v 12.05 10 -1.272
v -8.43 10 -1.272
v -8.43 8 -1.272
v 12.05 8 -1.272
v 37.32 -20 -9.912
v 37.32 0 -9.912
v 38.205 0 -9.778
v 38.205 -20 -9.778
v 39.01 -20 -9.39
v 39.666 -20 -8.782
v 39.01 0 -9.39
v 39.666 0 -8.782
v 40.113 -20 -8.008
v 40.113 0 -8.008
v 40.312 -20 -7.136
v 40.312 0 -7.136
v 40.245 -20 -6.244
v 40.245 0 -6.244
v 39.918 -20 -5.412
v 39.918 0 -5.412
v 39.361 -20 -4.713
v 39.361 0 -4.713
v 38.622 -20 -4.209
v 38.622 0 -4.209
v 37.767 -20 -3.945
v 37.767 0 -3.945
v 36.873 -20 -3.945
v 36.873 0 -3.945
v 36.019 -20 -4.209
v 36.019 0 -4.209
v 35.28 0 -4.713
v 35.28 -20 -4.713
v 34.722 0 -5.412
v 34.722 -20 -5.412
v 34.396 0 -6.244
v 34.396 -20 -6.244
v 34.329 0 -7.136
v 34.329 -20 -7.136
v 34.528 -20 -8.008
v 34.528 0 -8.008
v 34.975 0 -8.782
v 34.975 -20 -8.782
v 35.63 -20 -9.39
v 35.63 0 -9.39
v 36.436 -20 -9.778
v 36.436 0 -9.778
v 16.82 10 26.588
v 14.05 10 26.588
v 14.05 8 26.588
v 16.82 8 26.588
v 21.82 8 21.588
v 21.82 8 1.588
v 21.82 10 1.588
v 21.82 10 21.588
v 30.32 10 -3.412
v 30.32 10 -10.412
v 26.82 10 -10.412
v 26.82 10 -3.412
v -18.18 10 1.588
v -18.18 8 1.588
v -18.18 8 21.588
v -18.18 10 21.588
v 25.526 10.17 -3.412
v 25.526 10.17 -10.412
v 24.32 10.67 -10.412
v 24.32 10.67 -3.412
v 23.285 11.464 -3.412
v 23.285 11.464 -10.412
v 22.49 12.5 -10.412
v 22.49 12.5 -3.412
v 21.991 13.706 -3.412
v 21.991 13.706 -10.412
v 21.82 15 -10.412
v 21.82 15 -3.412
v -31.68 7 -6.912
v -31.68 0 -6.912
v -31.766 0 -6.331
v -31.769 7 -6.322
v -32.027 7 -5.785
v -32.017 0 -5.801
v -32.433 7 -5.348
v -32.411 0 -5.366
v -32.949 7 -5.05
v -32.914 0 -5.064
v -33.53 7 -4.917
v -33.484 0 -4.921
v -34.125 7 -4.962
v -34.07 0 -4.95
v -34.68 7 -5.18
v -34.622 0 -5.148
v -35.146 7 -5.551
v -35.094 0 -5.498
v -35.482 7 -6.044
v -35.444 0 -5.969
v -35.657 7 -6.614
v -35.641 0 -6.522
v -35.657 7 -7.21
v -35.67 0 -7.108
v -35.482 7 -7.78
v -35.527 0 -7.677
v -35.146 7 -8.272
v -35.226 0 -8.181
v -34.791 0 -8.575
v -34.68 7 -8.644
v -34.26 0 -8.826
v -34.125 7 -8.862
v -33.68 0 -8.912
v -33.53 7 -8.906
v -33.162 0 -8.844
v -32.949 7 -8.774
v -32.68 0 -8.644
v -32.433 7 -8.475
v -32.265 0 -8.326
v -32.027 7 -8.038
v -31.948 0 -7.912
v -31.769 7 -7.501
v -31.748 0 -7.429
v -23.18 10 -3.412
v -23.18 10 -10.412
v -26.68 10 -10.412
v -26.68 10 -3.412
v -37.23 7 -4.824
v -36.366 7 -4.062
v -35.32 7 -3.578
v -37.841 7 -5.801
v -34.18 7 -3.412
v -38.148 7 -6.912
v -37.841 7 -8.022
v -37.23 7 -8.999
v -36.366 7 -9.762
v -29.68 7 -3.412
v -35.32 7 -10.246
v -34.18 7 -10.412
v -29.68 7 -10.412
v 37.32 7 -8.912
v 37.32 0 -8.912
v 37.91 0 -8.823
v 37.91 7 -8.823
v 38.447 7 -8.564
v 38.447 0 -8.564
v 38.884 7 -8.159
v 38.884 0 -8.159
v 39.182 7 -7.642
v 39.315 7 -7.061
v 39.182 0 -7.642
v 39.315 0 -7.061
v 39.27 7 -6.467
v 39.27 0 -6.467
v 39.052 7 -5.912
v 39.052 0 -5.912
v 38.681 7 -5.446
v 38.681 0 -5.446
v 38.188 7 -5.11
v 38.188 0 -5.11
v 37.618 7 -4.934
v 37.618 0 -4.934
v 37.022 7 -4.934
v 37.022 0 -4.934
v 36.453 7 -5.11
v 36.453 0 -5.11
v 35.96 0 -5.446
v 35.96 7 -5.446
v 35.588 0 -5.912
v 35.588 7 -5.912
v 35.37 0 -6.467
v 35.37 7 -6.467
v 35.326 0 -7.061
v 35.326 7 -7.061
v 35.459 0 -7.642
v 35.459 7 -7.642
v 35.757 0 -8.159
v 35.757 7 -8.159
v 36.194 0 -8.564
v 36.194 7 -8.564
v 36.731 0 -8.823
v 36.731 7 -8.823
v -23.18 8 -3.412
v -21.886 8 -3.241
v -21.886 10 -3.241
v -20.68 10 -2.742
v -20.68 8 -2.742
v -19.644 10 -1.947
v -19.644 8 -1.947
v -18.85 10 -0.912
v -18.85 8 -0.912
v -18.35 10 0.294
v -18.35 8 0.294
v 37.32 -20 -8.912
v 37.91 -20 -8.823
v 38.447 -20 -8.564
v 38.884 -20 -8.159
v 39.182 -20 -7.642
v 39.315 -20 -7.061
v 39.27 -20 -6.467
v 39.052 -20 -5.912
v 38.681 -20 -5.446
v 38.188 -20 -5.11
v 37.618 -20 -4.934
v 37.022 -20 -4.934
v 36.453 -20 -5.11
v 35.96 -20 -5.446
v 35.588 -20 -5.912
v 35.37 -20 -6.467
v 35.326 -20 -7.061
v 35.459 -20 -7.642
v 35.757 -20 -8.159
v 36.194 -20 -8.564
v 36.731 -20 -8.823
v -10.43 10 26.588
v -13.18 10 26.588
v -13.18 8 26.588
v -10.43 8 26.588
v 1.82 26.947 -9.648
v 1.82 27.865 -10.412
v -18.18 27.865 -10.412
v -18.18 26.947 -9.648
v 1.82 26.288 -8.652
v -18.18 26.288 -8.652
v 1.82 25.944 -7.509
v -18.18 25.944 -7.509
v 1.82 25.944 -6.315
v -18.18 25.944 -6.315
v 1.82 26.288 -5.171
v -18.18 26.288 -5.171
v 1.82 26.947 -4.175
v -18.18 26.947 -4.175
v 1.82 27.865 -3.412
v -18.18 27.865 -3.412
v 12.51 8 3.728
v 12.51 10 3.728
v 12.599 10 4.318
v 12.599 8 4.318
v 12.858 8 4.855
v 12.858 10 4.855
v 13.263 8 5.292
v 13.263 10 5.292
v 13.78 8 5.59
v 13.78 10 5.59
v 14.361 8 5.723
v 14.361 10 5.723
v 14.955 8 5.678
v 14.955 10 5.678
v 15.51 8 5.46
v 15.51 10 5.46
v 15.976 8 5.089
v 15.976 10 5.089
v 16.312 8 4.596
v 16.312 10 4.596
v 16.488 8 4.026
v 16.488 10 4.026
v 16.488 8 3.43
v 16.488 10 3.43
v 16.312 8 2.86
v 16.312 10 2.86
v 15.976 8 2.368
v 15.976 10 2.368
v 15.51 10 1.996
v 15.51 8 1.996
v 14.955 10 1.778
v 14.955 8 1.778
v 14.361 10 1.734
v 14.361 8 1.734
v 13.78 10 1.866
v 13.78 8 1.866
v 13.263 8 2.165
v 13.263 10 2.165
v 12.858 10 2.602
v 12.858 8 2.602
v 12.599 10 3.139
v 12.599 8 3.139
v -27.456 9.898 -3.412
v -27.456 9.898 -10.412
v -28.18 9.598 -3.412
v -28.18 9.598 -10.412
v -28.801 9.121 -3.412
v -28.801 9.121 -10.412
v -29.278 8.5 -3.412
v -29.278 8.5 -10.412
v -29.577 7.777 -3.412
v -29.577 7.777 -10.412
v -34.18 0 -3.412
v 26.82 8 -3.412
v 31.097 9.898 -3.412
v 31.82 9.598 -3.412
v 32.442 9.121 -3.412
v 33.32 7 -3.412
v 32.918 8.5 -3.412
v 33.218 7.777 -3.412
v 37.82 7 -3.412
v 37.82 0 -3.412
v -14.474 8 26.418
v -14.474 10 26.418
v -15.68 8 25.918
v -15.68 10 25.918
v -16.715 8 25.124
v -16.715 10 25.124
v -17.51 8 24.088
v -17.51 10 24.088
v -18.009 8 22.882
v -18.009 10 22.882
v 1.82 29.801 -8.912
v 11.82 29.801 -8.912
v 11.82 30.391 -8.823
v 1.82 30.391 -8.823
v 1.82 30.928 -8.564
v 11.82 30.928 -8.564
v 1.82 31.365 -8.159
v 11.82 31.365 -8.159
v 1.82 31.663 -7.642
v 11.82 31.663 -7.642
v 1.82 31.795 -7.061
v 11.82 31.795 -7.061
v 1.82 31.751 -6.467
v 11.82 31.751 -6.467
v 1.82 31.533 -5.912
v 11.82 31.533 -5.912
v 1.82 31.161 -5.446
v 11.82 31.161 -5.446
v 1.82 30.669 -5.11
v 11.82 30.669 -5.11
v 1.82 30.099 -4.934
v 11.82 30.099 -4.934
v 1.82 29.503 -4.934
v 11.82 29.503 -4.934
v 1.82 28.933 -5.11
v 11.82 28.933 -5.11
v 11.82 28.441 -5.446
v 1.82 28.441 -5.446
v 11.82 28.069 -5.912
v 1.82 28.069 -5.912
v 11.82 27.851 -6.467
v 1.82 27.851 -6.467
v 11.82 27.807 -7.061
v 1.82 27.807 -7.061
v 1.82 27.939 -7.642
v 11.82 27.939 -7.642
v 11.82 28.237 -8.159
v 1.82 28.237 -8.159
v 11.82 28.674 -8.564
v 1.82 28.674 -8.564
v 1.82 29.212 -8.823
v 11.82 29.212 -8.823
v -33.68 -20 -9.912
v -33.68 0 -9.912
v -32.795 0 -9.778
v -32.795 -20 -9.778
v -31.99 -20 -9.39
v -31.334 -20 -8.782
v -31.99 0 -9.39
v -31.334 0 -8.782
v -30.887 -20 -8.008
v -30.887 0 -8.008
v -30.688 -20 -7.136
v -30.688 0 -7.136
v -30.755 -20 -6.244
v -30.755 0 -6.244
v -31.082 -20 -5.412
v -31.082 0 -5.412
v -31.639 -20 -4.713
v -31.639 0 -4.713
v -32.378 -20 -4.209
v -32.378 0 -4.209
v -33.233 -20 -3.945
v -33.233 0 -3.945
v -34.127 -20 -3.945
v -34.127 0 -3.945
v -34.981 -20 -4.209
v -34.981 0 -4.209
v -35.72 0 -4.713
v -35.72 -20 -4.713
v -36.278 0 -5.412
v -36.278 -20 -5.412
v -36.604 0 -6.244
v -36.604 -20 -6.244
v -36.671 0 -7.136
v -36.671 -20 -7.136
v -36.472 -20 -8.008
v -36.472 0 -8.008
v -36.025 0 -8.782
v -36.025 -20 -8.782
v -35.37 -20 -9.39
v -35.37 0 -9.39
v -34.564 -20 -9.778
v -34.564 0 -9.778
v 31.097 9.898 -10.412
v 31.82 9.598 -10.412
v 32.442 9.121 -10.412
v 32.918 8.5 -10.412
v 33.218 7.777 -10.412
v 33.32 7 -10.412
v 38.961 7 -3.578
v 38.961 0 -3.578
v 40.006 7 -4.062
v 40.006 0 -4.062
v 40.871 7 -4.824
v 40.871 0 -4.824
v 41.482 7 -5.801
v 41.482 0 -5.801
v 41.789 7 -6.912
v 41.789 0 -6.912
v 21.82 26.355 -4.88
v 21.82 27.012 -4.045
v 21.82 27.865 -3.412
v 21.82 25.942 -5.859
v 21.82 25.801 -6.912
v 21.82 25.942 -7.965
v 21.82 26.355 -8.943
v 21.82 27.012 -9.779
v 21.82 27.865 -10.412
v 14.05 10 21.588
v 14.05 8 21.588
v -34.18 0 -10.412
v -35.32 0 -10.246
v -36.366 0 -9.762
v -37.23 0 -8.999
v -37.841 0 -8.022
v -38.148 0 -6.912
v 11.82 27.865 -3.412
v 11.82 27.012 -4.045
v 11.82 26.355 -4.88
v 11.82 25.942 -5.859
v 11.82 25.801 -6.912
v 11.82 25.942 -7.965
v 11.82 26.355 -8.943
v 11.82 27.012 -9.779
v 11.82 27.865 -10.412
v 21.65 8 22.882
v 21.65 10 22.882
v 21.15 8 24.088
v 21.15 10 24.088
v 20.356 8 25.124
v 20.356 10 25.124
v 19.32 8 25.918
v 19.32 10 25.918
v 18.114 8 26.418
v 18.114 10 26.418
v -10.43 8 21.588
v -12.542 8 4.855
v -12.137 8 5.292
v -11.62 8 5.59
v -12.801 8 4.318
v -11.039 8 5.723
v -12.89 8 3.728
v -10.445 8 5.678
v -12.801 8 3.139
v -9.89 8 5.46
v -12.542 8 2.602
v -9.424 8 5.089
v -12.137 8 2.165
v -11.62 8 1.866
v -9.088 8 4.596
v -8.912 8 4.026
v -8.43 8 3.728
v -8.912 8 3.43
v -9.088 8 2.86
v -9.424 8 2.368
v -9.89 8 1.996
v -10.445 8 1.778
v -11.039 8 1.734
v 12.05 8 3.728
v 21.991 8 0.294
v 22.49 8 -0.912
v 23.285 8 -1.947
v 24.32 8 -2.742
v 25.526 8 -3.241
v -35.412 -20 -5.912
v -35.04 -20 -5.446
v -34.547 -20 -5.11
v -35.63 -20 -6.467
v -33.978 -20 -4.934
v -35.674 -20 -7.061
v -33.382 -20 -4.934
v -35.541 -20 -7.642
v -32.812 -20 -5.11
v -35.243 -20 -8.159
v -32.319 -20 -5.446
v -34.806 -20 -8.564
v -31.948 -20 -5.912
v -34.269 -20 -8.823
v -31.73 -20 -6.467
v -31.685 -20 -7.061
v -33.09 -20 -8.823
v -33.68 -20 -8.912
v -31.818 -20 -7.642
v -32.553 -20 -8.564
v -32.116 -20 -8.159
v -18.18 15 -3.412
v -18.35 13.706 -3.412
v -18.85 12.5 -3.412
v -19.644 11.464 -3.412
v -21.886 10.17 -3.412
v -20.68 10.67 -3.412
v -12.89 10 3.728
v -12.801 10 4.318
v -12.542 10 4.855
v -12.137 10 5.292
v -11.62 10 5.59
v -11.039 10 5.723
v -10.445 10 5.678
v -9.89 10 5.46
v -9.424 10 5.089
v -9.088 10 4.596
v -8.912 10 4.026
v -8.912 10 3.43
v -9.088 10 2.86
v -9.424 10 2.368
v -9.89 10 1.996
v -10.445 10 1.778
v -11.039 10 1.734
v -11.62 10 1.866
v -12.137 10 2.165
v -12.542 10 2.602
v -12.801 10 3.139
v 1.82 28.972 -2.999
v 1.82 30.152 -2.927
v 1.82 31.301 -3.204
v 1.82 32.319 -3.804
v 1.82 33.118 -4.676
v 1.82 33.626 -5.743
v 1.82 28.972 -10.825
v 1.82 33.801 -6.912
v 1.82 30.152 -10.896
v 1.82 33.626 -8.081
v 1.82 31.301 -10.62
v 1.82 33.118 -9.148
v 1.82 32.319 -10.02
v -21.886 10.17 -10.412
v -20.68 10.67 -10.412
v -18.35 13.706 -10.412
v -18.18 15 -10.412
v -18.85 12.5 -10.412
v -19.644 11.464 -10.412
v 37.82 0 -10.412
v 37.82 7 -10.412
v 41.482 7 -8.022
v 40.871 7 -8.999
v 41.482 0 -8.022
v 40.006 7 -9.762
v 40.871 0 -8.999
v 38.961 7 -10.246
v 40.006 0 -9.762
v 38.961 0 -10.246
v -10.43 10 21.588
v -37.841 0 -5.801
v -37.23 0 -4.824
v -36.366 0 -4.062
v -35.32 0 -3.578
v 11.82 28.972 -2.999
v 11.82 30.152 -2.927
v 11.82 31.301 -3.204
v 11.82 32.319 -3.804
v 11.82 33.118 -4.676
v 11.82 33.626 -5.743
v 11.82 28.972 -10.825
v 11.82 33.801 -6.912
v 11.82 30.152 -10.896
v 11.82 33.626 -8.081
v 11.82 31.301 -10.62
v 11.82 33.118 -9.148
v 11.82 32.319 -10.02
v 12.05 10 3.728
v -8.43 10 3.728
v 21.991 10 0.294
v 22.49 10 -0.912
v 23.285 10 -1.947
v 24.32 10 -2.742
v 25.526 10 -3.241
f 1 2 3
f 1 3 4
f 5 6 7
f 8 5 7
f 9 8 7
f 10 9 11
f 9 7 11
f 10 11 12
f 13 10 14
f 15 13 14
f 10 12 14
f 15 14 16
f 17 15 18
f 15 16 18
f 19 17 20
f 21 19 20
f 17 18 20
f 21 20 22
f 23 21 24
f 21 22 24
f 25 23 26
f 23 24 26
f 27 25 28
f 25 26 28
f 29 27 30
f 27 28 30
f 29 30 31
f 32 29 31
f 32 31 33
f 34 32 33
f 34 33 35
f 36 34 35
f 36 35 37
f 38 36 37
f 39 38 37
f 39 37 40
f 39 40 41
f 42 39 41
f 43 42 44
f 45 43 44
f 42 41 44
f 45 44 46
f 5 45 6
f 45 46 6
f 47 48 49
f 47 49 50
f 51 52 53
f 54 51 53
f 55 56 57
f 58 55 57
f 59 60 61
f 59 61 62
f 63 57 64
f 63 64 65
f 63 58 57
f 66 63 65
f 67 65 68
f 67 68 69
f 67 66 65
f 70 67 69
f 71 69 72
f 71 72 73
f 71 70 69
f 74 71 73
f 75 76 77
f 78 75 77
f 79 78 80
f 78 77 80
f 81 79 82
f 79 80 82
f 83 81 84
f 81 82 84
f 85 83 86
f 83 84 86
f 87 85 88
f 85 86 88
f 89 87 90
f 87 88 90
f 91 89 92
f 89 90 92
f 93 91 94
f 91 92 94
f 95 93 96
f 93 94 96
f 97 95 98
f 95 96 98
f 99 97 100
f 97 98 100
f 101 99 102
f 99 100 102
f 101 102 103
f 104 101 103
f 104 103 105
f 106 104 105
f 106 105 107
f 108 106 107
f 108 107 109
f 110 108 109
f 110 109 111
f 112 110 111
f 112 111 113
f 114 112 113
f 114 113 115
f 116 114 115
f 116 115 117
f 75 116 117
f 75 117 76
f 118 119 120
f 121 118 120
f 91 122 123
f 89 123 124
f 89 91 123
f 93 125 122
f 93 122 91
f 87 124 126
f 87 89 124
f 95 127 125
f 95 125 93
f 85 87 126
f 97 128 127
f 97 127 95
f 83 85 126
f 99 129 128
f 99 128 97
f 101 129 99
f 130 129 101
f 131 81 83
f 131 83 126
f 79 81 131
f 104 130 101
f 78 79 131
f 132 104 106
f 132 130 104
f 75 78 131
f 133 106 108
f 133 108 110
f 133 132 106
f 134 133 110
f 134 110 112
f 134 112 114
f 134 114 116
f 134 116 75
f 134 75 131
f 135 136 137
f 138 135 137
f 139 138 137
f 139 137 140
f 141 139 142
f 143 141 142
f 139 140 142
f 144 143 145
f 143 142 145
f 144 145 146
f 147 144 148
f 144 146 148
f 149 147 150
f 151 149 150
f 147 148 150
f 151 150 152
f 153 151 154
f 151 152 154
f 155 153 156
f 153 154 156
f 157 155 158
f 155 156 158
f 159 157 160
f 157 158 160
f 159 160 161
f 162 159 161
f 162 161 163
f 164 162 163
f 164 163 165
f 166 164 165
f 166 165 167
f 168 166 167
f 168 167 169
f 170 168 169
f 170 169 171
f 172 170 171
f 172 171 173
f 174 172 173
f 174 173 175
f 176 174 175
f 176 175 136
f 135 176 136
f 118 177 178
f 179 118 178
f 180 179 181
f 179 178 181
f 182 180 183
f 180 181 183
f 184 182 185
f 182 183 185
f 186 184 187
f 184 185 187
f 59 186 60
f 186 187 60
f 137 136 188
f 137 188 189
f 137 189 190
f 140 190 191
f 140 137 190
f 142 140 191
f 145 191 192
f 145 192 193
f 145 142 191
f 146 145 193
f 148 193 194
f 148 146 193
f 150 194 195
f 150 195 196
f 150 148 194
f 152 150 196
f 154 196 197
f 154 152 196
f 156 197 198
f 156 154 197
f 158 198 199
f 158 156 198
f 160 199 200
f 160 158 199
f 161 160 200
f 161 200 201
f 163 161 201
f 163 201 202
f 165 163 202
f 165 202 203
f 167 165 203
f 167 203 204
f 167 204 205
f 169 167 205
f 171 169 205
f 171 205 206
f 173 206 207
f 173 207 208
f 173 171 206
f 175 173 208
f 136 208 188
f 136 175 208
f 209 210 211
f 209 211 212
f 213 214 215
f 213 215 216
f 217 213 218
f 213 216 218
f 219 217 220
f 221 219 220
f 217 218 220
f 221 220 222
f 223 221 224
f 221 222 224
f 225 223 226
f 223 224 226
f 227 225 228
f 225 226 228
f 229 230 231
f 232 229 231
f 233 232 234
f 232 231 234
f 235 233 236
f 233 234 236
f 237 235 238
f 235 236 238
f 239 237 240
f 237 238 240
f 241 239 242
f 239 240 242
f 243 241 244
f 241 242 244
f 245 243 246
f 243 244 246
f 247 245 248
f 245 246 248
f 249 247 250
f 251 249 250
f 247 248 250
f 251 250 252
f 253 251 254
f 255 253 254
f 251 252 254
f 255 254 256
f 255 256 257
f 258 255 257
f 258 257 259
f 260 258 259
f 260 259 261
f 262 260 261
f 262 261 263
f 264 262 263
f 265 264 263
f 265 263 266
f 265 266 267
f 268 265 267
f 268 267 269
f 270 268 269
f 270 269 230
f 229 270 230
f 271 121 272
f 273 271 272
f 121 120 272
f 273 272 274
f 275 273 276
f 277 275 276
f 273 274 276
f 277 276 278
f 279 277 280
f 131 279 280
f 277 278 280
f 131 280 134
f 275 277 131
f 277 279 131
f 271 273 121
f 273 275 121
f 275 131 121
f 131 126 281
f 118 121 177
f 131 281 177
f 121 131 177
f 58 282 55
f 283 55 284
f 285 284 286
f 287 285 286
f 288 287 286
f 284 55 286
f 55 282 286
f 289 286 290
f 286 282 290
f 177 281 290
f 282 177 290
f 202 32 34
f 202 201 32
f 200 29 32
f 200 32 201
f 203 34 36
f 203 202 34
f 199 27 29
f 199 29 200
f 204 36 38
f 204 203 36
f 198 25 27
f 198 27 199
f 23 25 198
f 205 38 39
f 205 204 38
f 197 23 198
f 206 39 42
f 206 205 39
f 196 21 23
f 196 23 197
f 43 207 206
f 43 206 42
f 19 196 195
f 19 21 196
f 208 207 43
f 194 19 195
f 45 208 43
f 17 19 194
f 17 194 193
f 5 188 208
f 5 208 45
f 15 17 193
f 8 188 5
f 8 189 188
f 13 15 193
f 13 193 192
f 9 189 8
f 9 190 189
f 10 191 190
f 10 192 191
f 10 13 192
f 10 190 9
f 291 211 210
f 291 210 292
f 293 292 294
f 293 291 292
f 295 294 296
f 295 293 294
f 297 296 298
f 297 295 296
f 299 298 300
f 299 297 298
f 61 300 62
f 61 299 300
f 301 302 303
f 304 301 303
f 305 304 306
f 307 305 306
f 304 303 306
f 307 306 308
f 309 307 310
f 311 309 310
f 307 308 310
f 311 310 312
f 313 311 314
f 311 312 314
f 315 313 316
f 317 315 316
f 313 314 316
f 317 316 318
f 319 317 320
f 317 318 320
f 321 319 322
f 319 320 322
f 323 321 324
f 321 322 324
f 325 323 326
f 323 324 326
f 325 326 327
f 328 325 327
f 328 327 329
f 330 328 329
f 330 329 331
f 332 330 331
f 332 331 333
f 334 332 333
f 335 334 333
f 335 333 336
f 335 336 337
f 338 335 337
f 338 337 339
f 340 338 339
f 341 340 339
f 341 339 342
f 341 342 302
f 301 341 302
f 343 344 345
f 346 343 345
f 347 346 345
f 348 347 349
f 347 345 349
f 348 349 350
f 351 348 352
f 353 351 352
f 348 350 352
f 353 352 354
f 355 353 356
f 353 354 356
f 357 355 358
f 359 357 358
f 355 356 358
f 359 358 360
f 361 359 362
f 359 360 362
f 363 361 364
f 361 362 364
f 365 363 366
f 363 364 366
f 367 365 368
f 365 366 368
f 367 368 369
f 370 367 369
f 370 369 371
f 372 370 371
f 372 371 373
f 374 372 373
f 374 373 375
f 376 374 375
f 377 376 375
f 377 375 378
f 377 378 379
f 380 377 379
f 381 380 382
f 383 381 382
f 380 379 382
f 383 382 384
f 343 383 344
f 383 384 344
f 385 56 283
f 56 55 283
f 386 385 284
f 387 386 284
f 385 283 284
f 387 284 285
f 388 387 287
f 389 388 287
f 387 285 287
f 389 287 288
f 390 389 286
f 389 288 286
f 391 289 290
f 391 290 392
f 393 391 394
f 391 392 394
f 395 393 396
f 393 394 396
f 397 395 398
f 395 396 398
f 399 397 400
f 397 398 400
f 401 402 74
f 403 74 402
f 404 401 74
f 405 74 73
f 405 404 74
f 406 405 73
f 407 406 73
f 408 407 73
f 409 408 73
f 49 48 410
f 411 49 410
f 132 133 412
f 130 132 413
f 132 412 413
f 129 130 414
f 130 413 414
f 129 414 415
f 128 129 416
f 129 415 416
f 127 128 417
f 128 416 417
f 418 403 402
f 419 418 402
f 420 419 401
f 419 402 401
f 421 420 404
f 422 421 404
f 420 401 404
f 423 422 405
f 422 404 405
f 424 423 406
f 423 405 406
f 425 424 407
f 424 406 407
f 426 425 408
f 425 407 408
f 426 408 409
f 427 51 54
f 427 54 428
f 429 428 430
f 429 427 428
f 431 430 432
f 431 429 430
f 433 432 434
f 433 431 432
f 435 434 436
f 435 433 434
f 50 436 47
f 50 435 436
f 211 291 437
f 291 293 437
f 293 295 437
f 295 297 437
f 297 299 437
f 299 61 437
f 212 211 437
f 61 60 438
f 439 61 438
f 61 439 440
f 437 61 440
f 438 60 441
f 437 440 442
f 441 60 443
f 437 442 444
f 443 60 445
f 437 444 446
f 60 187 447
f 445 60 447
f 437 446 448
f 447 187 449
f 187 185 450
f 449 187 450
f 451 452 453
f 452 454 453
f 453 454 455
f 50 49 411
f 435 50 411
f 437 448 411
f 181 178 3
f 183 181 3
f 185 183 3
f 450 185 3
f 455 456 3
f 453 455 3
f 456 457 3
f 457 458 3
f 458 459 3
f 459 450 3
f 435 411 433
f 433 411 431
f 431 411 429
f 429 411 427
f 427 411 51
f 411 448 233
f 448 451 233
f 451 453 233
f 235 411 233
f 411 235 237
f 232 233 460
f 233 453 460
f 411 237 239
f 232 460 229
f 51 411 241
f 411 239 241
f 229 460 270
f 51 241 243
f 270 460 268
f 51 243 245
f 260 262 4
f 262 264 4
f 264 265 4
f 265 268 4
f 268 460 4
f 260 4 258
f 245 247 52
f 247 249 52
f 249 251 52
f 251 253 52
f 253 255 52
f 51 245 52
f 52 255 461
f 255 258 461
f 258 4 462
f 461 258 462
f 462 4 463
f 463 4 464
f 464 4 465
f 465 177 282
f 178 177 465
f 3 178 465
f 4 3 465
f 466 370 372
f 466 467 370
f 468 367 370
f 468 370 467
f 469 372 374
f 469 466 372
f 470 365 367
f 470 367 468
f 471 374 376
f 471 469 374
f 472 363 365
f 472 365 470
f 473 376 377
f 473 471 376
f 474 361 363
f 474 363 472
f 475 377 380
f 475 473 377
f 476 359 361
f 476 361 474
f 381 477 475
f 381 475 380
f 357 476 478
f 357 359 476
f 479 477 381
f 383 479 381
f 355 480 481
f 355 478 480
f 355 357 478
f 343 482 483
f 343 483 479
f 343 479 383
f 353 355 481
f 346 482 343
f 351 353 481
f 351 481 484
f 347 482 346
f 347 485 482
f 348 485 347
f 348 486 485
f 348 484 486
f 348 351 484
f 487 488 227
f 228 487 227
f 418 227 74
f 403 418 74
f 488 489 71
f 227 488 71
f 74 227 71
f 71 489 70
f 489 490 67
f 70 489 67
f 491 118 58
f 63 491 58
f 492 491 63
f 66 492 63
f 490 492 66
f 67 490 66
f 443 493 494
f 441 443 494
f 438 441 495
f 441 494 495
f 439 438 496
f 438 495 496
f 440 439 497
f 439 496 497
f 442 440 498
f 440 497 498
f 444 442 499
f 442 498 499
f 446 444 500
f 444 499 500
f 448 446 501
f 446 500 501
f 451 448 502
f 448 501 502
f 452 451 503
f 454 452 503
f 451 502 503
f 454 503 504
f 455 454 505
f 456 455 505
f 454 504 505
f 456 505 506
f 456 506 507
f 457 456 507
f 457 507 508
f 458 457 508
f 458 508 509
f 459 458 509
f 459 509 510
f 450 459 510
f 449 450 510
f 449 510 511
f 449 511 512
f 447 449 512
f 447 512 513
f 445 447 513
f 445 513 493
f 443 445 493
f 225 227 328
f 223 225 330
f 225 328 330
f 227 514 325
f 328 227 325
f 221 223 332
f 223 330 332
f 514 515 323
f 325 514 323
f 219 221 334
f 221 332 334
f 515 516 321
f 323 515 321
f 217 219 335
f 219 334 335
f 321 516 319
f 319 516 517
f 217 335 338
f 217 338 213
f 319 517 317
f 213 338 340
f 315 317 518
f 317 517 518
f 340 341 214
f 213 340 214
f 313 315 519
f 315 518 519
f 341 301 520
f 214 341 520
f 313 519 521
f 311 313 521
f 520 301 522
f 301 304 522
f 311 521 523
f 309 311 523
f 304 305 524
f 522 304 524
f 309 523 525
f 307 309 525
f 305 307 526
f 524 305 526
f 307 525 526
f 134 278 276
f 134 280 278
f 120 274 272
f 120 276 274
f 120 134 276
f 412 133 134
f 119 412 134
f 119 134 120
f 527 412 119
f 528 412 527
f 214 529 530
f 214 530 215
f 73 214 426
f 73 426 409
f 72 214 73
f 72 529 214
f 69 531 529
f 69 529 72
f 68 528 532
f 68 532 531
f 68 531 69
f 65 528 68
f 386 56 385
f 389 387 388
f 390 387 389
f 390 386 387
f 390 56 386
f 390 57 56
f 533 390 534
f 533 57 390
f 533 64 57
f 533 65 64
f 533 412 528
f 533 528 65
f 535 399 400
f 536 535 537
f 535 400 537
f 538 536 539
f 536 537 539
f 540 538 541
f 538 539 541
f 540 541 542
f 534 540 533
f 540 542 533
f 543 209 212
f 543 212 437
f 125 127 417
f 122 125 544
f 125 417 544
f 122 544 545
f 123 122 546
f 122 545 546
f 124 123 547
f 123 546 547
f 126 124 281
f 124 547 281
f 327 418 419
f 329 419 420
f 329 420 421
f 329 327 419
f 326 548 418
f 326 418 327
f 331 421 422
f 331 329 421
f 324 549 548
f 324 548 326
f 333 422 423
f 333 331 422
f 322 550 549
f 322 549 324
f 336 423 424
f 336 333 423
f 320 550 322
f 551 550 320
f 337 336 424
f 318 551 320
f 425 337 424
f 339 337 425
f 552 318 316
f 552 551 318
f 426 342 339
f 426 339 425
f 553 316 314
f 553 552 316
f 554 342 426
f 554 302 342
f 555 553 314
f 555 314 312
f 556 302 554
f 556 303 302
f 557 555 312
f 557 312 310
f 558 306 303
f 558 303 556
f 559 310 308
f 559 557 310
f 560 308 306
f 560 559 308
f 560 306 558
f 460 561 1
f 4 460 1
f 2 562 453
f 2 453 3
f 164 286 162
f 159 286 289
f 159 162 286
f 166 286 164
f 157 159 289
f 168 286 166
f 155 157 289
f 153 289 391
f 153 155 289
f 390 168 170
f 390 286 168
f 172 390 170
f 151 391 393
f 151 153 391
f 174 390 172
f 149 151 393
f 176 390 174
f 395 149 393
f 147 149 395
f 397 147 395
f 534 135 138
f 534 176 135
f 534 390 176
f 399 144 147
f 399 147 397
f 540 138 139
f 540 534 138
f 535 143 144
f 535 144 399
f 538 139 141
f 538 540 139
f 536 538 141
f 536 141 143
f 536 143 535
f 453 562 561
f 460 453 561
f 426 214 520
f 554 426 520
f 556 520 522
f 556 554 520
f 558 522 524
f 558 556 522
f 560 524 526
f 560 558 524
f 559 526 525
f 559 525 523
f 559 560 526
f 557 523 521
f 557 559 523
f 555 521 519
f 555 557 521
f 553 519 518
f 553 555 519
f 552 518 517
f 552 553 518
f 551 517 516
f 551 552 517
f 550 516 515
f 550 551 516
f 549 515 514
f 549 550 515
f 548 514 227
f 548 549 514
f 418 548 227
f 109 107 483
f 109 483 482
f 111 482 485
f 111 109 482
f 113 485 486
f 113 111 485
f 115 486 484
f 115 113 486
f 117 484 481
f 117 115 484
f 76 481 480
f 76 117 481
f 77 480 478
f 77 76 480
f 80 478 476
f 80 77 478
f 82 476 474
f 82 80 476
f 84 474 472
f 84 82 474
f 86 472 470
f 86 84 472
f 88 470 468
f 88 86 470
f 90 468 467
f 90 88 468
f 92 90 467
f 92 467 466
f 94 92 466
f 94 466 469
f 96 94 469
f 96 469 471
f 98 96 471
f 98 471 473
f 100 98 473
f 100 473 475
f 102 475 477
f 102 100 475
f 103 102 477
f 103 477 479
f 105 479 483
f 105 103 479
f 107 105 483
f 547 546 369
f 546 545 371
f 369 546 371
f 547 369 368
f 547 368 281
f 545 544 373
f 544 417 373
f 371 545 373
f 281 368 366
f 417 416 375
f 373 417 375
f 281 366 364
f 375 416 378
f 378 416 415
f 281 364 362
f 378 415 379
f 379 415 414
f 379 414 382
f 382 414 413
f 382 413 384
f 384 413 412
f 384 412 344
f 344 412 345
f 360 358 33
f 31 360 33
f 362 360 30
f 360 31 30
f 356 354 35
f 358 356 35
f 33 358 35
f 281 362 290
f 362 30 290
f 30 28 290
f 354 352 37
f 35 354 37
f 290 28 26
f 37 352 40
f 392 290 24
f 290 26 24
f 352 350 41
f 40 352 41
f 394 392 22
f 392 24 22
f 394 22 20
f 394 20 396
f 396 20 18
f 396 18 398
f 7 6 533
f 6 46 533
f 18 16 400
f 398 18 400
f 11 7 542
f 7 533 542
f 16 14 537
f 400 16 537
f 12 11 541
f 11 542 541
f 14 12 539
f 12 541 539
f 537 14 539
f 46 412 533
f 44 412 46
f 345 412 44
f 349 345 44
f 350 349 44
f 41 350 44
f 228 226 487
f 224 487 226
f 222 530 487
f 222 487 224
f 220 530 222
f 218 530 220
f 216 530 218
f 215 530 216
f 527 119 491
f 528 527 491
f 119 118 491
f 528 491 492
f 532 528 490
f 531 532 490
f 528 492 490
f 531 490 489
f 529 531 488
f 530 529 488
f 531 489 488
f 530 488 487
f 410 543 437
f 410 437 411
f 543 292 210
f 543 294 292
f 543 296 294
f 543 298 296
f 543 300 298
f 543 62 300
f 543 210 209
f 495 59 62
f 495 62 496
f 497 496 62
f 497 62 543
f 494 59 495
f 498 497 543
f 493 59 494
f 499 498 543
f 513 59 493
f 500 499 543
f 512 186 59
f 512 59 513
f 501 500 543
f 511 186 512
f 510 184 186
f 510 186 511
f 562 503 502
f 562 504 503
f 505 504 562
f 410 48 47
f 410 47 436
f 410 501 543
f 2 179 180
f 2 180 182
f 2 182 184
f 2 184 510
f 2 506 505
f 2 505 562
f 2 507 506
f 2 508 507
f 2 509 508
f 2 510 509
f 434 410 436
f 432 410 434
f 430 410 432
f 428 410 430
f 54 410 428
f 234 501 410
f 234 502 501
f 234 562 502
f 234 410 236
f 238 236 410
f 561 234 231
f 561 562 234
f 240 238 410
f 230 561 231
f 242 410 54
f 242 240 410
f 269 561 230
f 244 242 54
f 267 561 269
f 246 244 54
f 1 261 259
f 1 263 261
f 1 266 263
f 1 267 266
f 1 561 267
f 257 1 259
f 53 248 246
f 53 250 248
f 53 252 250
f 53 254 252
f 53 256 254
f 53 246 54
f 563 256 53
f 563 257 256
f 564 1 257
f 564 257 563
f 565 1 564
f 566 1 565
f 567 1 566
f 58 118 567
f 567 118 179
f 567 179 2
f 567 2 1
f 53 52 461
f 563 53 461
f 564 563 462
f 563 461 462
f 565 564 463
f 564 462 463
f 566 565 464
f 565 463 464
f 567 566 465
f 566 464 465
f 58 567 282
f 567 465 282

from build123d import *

# Parameters (mm, degrees)
SKETCH1_W           = 80
SKETCH1_H           = 7
BOSS_EXTRUDE1_DEPTH = 30
SKETCH2_R           = 3
SKETCH2_R_2         = 2
BOSS_EXTRUDE2_DEPTH = 20
SKETCH7_W           = 20
SKETCH7_H           = 20
CUT_EXTRUDE1_DEPTH  = 52.941693496
SKETCH9_R           = 4.1
CUT_EXTRUDE2_DEPTH  = 68.885232888
SKETCH11_R          = 4
SKETCH11_R_2        = 2
BOSS_EXTRUDE6_DEPTH = 20
FILLET1_R           = 5
FILLET2_R           = 4
SKETCH14_W          = 40
SKETCH14_H          = 2
BOSS_EXTRUDE8_DEPTH = 30
FILLET4_START       = 8
FILLET4_DEPTH       = 2
FILLET4_2_DEPTH     = 2
SKETCH15_R          = 2
CUT_EXTRUDE3_DEPTH  = 58.907259499
SKETCH16_W          = 20.48
SKETCH16_H          = 5
SKETCH16_W_2        = 24.48
CUT_EXTRUDE4_DEPTH  = 58.907259499
SKETCH11_2_R        = 4
SKETCH11_2_R_2      = 2
CUT_EXTRUDE5_DEPTH  = 10
CUT_EXTRUDE6_REACH  = 61.965
SKETCH17_R          = 2
CUT_EXTRUDE7_START  = -3
CUT_EXTRUDE7_DEPTH  = 3
FILLET5_R           = 3


with BuildPart() as part:
    # Sketch1 → Boss-Extrude1 (new body)
    with BuildSketch(Plane(origin=(0, 0, 0), x_dir=(1, 0, 0), z_dir=(0, 1, 0))):
        with Locations((1.820324284, 6.911764706)):
            Rectangle(SKETCH1_W, SKETCH1_H)
    extrude(amount=BOSS_EXTRUDE1_DEPTH)

    # Sketch2 → Boss-Extrude2 (add)
    # profile 1 of 2: a face of its own
    with BuildSketch(Plane.XZ):
        with Locations(Location((-33.679675716, -6.911764706, 0), (0, 0, 270))):
            Circle(SKETCH2_R)
        with Locations(Location((-33.679675716, -6.911764706, 0), (0, 0, 270))):
            Circle(SKETCH2_R_2, mode=Mode.SUBTRACT)
    # profile 2 of 2: a face of its own
    with BuildSketch(Plane.XZ):
        with Locations(Location((37.320324284, -6.911764706, 0), (0, 0, 270))):
            Circle(SKETCH2_R)
        with Locations(Location((37.320324284, -6.911764706, 0), (0, 0, 270))):
            Circle(SKETCH2_R_2, mode=Mode.SUBTRACT)
    extrude(amount=BOSS_EXTRUDE2_DEPTH)

    # Sketch7 → Cut-Extrude1 (cut, through all)
    with BuildSketch(Plane(origin=(0, 0, -10.411764706), x_dir=(-1, 0, 0), z_dir=(0, 0, -1))):
        with Locations((-31.820324284, 20)):
            Rectangle(SKETCH7_W, SKETCH7_H)
        with Locations((28.179675716, 20)):
            Rectangle(SKETCH7_W, SKETCH7_H)
    extrude(amount=-CUT_EXTRUDE1_DEPTH, mode=Mode.SUBTRACT)

    # Sketch9 → Cut-Extrude2 (cut, through all)
    with BuildSketch(Plane.ZY.offset(18.179675716)):
        with Locations((-6.911764706, 30)):
            Circle(SKETCH9_R)
    extrude(amount=-CUT_EXTRUDE2_DEPTH, mode=Mode.SUBTRACT)

    # Sketch11 → Boss-Extrude6 (add)
    with BuildSketch(Plane(origin=(21.820324284, 0, 0), x_dir=(0, 0, -1), z_dir=(1, 0, 0))):
        with Locations((6.911764706, 29.801076023)):
            Circle(SKETCH11_R)
        with Locations((6.911764706, 29.801076023)):
            Circle(SKETCH11_R_2, mode=Mode.SUBTRACT)
    extrude(amount=-BOSS_EXTRUDE6_DEPTH)

    # Fillet1
    fillet1_edges = [part.edges().sort_by_distance(p)[0] for p in [
        (21.820324284, 10, -6.911764706),
        (-18.179675716, 10, -6.911764706),
    ]]
    fillet(fillet1_edges, radius=FILLET1_R)

    # Fillet2
    # the kernel refuses this fillet: 4 mm, written as the material it takes off along each edge
    with BuildSketch(Plane(origin=(41.820324284, -10, -10.411764706), x_dir=(-1, 0, 0), z_dir=(0, 1, 0)), Plane(origin=(41.820324284, -10, -3.411764706), x_dir=(0, 0, -1), z_dir=(0, 1, 0))) as fillet2_piece_1:
        with BuildLine():
            CenterArc((FILLET2_R, FILLET2_R), FILLET2_R, 180, 90)
            Line((0, FILLET2_R), (0, 0))
            Line((0, 0), (FILLET2_R, 0))
        make_face()
    extrude(amount=30, mode=Mode.SUBTRACT)
    with BuildSketch(Plane(origin=(-38.179675716, -10, -3.411764706), x_dir=(0, 0, -1), z_dir=(0, 1, 0)), Plane(origin=(-38.179675716, -10, -10.411764706), x_dir=(1, 0, 0), z_dir=(0, 1, 0))) as fillet2_piece_2:
        with BuildLine():
            CenterArc((FILLET2_R, -FILLET2_R), FILLET2_R, 90, 90)
            Line((0, -FILLET2_R), (0, 0))
            Line((0, 0), (FILLET2_R, 0))
        make_face()
    extrude(amount=30, mode=Mode.SUBTRACT)

    # Sketch14 → Boss-Extrude8 (add)
    with BuildSketch(Plane.XY.offset(-3.411764706)):
        with Locations((1.820324284, 9)):
            Rectangle(SKETCH14_W, SKETCH14_H)
    extrude(amount=BOSS_EXTRUDE8_DEPTH)

    # Fillet4: read off the stored shape, not the designer's step
    # Fillet4 outline → Fillet4 (cut)
    with BuildSketch(Plane(origin=(0, 0, 0), x_dir=(1, 0, 0), z_dir=(0, 1, 0)).offset(FILLET4_START)):
        with BuildLine():
            Line((-18.179675716, -26.588235294), (-13.179675716, -26.588235294))
            ThreePointArc((-13.179675716, -26.588235294), (-16.715209622, -25.1237692), (-18.179675716, -21.588235294))
            Line((-18.179675716, -21.588235294), (-18.179675716, -26.588235294))
        make_face()
        with BuildLine():
            ThreePointArc((21.820324284, -21.588235294), (20.35585819, -25.123769199), (16.820324284, -26.588235294))
            Line((16.820324284, -26.588235294), (21.820324284, -26.588235294))
            Line((21.820324284, -26.588235294), (21.820324284, -21.588235294))
        make_face()
    extrude(amount=FILLET4_DEPTH, mode=Mode.SUBTRACT)

    # Fillet4 2 outline → Fillet4 2 (add)
    with BuildSketch(Plane(origin=(0, 0, 0), x_dir=(1, 0, 0), z_dir=(0, 1, 0)).offset(FILLET4_START)):
        with BuildLine():
            ThreePointArc((-23.179675716, 3.411764706), (-19.64414181, 1.947298611), (-18.179675716, -1.588235294))
            Line((-18.179675716, -1.588235294), (-18.179675716, 3.411764706))
            Line((-18.179675716, 3.411764706), (-23.179675716, 3.411764706))
        make_face()
        with BuildLine():
            Line((21.820324284, 3.411764706), (21.820324284, -1.588235294))
            ThreePointArc((21.820324284, -1.588235294), (23.284790378, 1.947298612), (26.820324284, 3.411764706))
            Line((26.820324284, 3.411764706), (21.820324284, 3.411764706))
        make_face()
    extrude(amount=FILLET4_2_DEPTH)

    # Sketch15 → Cut-Extrude3 (cut, through all)
    with BuildSketch(Plane(origin=(0, 10, 0), x_dir=(1, 0, 0), z_dir=(0, 1, 0))):
        with Locations(Location((-10.889675716, -3.728235294, 0), (0, 0, 180))):
            Circle(SKETCH15_R)
        with Locations(Location((14.510324284, -3.728235294, 0), (0, 0, 180))):
            Circle(SKETCH15_R)
    extrude(amount=-CUT_EXTRUDE3_DEPTH, mode=Mode.SUBTRACT)

    # Sketch16 → Cut-Extrude4 (cut, through all)
    with BuildSketch(Plane(origin=(0, 10, 0), x_dir=(1, 0, 0), z_dir=(0, 1, 0))):
        with Locations((1.810324284, -1.228235294)):
            Rectangle(SKETCH16_W, SKETCH16_H)
        with Locations((1.810324284, -24.088235294)):
            Rectangle(SKETCH16_W_2, SKETCH16_H)
    extrude(amount=-CUT_EXTRUDE4_DEPTH, mode=Mode.SUBTRACT)

    # Sketch11<2> → Cut-Extrude5 (cut)
    with BuildSketch(Plane(origin=(21.820324284, 0, 0), x_dir=(0, 0, -1), z_dir=(1, 0, 0))):
        with Locations((6.911764706, 29.801076023)):
            Circle(SKETCH11_2_R)
        with Locations((6.911764706, 29.801076023)):
            Circle(SKETCH11_2_R_2, mode=Mode.SUBTRACT)
    extrude(amount=-CUT_EXTRUDE5_DEPTH, mode=Mode.SUBTRACT)

    # Sketch17 → Cut-Extrude6 (cut, up to next)
    with BuildSketch(Plane.XZ, mode=Mode.PRIVATE) as cut_extrude6_sk1:
        with Locations(Location((37.320324284, -6.911764706, 0), (0, 0, 270))):
            Circle(SKETCH17_R)
    cut_extrude6_tool1 = extrude(cut_extrude6_sk1.sketch, amount=-CUT_EXTRUDE6_REACH, mode=Mode.PRIVATE) & part.part
    # Sketch17 → Cut-Extrude6 (cut, up to next)
    with BuildSketch(Plane.XZ, mode=Mode.PRIVATE) as cut_extrude6_sk2:
        with Locations((-33.679675716, -6.911764706)):
            Circle(SKETCH17_R)
    cut_extrude6_tool2 = extrude(cut_extrude6_sk2.sketch, amount=-CUT_EXTRUDE6_REACH, mode=Mode.PRIVATE) & part.part
    add(cut_extrude6_tool1.solids().sort_by_distance((37.320324, 0, -6.911765))[0], mode=Mode.SUBTRACT)
    add(cut_extrude6_tool2.solids().sort_by_distance((-33.679676, 0, -6.911765))[0], mode=Mode.SUBTRACT)

    # Sketch18 → Cut-Extrude7 (cut)
    with BuildSketch(Plane(origin=(0, 10, 0), x_dir=(1, 0, 0), z_dir=(0, 1, 0)).offset(CUT_EXTRUDE7_START)):
        with BuildLine():
            Line((37.820324284, 10.411764706), (33.320324284, 10.411764706))
            Line((33.320324284, 10.411764706), (33.320324284, 3.411764706))
            Line((33.320324284, 3.411764706), (37.820324284, 3.411764706))
            ThreePointArc((37.820324284, 3.411764706), (40.466075595, 4.411764706), (41.78895125, 6.911764706))
            ThreePointArc((41.78895125, 6.911764706), (40.466075595, 9.411764706), (37.820324284, 10.411764706))
        make_face()
        with BuildLine():
            Line((-34.179675716, 3.411764706), (-29.679675716, 3.411764706))
            Line((-29.679675716, 3.411764706), (-29.679675716, 10.411764706))
            Line((-29.679675716, 10.411764706), (-34.179675716, 10.411764706))
            ThreePointArc((-34.179675716, 10.411764706), (-36.825427028, 9.411764706), (-38.148302683, 6.911764706))
            ThreePointArc((-38.148302683, 6.911764706), (-36.825427028, 4.411764706), (-34.179675716, 3.411764706))
        make_face()
    extrude(amount=CUT_EXTRUDE7_DEPTH, mode=Mode.SUBTRACT)

    # Fillet5
    fillet5_edges = [part.edges().sort_by_distance(p)[0] for p in [
        (-29.679675716, 10, -6.911764706),
        (33.320324284, 10, -6.911764706),
    ]]
    fillet(fillet5_edges, radius=FILLET5_R - 0.0001)  # a hair under: the kernel refuses the full size


solid = part.part
